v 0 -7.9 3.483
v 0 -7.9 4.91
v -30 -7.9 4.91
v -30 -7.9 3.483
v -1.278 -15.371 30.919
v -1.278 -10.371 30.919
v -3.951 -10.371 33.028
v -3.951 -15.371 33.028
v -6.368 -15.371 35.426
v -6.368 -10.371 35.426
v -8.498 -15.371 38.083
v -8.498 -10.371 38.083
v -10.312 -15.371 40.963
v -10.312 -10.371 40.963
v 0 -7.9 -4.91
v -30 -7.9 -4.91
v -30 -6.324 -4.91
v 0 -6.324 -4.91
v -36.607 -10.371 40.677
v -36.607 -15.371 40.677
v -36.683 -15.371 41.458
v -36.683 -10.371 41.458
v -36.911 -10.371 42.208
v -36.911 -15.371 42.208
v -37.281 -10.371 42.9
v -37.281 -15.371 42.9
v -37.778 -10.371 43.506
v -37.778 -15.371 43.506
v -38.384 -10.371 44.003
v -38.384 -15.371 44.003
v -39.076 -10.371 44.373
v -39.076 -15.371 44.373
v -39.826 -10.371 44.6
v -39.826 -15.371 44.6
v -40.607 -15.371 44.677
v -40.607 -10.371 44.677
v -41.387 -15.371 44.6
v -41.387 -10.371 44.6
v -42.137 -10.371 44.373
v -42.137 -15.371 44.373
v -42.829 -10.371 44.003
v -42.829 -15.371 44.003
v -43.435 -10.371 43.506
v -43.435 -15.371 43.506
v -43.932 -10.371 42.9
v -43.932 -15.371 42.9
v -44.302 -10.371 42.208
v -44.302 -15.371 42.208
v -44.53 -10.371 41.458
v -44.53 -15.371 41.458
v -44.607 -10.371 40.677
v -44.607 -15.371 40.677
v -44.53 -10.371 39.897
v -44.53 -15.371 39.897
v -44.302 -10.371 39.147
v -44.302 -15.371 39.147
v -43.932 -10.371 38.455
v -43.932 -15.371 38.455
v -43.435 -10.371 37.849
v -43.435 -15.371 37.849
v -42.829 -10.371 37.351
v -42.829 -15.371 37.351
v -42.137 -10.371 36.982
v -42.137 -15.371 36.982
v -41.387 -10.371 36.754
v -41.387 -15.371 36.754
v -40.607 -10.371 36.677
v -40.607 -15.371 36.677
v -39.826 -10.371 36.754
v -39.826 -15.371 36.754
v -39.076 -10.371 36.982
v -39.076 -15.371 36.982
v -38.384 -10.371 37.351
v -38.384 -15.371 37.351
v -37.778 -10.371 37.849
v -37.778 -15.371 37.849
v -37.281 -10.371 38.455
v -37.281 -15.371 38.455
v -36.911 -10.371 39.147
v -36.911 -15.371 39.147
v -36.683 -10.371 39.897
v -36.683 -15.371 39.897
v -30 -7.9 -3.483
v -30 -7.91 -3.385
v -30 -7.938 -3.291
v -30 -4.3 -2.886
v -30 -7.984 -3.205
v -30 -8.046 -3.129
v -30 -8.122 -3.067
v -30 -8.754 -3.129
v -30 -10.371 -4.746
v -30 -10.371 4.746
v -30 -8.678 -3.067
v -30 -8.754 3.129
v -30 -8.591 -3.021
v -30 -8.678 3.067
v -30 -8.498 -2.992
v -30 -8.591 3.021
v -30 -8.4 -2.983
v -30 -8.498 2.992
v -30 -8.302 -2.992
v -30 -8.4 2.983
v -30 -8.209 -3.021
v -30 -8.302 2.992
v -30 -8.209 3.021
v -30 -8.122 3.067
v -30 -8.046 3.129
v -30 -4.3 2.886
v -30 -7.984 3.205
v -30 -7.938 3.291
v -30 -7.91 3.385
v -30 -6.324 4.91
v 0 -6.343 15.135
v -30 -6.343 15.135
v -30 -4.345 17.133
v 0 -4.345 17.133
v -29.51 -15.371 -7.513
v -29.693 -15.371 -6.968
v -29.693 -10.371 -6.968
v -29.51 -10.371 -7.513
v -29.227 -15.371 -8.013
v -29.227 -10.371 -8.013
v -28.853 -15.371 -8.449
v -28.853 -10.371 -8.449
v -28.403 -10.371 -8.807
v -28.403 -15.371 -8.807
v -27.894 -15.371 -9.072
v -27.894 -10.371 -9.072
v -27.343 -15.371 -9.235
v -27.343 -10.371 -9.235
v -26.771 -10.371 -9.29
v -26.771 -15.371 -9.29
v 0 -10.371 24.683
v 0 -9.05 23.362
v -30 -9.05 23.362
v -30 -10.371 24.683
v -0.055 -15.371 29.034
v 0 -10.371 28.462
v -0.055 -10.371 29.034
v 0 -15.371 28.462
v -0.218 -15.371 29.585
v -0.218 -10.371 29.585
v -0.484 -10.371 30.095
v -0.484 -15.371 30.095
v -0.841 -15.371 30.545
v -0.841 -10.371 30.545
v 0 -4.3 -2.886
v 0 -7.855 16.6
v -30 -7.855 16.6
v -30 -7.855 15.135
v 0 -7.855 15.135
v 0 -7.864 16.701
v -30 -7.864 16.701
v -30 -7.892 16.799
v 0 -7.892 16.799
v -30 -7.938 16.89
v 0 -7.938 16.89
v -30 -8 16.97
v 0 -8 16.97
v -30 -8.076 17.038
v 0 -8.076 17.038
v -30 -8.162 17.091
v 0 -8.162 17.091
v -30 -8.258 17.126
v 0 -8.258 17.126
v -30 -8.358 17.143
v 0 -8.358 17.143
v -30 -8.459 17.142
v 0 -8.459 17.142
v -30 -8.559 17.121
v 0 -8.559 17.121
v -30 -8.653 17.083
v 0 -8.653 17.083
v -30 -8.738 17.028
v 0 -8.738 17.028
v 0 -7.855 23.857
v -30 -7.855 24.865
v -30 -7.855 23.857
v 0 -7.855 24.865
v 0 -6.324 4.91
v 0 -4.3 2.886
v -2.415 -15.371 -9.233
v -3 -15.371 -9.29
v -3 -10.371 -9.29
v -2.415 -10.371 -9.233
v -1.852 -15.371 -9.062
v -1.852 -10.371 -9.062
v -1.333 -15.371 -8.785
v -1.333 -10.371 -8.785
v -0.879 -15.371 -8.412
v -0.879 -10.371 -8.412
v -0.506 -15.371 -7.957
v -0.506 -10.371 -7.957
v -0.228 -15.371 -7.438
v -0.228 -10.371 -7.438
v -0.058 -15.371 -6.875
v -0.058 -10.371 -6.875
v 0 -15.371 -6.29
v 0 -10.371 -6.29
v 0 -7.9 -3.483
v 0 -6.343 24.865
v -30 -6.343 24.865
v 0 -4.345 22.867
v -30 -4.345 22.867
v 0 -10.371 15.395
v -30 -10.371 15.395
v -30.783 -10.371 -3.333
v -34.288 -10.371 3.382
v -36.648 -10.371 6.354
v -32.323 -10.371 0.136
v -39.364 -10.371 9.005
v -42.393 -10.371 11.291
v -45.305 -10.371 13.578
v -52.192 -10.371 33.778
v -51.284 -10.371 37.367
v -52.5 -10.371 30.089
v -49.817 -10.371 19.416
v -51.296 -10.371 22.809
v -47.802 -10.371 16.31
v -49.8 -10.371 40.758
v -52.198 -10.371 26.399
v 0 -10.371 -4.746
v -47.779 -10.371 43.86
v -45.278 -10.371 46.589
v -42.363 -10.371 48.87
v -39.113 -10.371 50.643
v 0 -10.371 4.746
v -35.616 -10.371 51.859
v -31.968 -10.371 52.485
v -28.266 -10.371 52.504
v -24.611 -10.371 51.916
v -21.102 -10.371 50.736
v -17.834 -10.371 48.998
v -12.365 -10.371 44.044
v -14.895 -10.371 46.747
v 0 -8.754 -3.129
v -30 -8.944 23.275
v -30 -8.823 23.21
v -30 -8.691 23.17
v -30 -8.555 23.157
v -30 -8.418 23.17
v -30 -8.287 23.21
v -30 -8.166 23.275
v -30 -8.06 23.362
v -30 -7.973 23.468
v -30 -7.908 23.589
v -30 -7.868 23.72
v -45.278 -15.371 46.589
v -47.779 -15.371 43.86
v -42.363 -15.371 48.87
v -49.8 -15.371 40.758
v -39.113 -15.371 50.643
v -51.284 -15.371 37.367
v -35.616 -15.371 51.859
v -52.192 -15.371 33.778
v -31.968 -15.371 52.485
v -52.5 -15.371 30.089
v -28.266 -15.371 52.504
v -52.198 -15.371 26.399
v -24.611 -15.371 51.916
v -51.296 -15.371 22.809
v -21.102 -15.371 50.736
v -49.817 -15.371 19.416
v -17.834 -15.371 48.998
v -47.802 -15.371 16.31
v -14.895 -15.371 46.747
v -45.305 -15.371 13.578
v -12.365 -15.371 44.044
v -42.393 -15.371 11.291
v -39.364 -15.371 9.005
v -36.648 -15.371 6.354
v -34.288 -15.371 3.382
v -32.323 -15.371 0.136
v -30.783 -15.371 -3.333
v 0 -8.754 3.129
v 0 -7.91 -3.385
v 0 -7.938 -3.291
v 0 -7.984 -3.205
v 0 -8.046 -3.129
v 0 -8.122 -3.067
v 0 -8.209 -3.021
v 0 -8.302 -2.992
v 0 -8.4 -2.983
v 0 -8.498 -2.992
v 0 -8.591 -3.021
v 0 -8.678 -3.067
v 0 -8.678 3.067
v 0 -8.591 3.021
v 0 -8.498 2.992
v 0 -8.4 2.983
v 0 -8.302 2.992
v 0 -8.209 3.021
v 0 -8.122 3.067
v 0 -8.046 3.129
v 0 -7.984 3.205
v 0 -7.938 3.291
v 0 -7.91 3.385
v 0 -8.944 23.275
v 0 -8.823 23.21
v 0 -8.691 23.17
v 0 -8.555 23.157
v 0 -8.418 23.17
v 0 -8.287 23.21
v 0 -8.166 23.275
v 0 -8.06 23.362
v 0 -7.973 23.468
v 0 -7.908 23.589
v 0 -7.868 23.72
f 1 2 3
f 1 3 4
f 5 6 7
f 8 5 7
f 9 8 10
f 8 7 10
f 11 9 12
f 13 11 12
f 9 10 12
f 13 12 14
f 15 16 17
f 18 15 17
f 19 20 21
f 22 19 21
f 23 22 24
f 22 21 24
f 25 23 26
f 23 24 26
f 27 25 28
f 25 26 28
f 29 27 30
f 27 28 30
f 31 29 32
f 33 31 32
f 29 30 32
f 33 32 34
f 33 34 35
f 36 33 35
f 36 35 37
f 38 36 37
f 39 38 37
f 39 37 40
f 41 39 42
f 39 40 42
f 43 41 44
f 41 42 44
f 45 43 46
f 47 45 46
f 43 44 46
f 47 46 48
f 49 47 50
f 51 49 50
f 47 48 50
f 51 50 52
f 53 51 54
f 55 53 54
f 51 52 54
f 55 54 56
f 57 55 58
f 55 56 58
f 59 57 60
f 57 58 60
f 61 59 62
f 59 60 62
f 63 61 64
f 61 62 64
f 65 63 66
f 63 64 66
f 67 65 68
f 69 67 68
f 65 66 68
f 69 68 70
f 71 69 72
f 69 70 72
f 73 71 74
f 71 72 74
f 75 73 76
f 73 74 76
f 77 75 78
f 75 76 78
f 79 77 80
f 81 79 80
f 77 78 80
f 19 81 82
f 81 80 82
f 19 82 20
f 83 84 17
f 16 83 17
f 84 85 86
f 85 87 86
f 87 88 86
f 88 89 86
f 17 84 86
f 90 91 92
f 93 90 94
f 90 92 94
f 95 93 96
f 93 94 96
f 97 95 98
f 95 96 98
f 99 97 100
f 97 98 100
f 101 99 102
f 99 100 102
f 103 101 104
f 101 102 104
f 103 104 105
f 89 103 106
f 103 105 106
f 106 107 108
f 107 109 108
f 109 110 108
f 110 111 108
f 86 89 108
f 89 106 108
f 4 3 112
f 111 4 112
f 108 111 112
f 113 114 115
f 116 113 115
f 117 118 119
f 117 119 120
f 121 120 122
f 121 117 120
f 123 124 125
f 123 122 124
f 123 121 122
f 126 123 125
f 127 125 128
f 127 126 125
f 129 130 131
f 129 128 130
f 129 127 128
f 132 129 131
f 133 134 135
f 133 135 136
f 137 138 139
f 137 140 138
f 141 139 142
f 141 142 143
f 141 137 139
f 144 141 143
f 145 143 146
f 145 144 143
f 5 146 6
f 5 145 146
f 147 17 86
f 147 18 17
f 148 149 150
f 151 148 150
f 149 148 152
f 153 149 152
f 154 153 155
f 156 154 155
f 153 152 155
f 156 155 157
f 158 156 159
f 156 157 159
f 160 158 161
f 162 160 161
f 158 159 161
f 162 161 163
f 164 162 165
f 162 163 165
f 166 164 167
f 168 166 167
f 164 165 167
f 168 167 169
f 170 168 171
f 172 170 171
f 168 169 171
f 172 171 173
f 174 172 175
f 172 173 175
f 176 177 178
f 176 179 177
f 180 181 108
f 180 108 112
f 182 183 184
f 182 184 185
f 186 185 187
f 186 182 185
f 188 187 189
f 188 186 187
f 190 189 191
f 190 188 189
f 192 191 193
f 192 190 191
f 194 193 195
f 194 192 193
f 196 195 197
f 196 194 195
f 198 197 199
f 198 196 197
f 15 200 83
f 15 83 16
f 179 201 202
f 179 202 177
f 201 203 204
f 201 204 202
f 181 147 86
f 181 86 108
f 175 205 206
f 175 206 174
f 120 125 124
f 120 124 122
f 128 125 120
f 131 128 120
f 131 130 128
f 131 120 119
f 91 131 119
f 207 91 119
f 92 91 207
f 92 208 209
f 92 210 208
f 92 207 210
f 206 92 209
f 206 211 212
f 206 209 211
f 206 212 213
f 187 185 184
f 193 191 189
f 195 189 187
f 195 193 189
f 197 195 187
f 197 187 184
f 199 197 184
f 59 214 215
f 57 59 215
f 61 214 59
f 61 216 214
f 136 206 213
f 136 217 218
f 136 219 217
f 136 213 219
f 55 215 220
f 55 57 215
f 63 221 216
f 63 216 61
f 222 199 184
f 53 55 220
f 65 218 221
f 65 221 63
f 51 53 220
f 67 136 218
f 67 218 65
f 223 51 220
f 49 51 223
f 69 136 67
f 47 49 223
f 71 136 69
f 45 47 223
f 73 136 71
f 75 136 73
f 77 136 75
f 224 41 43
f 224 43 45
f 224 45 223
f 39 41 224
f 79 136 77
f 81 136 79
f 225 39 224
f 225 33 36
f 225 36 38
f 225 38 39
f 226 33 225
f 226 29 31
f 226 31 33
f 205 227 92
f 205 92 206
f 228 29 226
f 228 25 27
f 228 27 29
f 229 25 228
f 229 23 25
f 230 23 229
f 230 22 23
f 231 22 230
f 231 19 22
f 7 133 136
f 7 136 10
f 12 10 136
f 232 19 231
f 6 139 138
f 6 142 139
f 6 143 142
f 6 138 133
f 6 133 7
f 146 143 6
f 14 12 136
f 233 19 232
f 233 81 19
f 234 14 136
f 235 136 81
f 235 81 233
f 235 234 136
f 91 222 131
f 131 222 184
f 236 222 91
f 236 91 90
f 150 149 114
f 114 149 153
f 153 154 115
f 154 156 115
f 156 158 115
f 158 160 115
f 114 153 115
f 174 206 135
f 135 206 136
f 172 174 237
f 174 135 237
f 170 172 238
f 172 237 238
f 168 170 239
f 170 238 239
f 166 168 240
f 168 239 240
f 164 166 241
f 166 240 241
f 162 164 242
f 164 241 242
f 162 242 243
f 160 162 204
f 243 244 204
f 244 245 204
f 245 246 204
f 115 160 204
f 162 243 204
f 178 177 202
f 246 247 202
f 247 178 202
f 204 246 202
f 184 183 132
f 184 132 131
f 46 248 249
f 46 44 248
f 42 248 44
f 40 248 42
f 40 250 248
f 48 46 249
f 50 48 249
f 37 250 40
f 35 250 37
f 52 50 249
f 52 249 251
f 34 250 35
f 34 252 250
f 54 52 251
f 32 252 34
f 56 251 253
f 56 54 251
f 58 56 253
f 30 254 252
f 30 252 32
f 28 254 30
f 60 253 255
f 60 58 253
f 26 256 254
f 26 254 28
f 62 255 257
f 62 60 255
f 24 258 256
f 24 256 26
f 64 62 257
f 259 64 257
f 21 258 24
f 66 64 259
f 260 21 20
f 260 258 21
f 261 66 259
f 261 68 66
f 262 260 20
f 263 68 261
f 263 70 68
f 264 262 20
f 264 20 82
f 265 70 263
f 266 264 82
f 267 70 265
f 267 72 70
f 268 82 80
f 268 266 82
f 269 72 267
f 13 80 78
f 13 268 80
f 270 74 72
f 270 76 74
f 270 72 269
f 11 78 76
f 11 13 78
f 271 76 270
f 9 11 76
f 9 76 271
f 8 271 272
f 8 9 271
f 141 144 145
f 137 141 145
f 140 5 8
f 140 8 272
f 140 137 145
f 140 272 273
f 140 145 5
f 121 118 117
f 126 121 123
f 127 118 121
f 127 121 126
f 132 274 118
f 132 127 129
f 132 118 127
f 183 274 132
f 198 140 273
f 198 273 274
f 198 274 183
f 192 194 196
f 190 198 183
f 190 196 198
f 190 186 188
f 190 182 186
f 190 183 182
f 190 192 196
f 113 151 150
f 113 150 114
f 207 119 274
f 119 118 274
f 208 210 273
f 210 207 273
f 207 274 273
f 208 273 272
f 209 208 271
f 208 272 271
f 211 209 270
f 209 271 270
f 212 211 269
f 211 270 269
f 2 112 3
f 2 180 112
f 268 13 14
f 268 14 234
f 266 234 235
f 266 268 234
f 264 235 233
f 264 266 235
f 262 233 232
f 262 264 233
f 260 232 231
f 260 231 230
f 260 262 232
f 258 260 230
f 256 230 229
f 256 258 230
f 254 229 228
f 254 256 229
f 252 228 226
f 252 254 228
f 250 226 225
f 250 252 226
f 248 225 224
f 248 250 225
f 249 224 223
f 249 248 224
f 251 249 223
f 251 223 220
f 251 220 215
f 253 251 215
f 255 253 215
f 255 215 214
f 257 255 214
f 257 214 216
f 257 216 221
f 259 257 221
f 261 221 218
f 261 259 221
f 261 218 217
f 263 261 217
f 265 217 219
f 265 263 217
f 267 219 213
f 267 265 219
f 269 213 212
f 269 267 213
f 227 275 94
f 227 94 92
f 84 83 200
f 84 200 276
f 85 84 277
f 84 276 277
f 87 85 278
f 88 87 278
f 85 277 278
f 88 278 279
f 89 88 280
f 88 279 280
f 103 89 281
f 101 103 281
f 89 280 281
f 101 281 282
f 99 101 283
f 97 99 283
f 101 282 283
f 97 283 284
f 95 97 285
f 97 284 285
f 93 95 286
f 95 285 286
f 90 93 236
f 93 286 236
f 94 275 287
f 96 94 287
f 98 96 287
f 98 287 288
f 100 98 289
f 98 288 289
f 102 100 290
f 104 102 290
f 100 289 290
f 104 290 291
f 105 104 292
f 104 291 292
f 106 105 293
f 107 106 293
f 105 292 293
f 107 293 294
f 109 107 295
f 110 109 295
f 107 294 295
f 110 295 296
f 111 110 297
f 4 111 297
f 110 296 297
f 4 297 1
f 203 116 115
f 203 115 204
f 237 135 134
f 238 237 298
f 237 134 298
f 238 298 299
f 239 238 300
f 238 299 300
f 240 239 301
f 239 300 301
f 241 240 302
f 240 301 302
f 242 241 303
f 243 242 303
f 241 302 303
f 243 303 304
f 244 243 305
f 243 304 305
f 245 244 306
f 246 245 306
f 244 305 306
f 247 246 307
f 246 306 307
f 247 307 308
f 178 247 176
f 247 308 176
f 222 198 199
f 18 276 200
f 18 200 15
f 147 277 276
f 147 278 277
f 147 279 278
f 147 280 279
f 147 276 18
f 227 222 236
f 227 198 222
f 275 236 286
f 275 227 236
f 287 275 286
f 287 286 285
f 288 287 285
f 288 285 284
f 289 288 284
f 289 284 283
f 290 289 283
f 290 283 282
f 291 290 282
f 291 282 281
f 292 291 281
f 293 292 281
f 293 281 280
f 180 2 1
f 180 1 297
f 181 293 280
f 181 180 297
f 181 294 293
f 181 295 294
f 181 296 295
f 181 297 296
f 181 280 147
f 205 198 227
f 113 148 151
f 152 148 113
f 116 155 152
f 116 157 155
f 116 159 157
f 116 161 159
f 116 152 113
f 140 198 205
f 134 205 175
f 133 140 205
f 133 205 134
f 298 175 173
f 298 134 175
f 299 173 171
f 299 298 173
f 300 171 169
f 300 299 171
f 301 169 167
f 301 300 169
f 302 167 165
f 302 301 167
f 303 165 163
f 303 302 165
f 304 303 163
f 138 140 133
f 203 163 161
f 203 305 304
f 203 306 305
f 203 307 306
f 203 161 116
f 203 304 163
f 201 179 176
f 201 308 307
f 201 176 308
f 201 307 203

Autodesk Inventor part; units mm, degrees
ref_plane "YZ Plane" through (0, 0, 0) normal (1, 0, 0) x (0, 1, 0)
ref_plane "XZ Plane" through (0, 0, 0) normal (0, 1, 0) x (-1, 0, 0)
ref_plane "XY Plane" through (0, 0, 0) normal (0, 0, 1) x (1, 0, 0)
sketch "Sketch1" plane through (0, 0, 0) normal (1, 0, 0) x (0, 1, 0)
  line L0 (-10.3707, -4.7464) -> (-8.7536, -3.1293)
  line L1 (-10.3707, 15.395) -> (-8.7381, 17.0275)
  arc A0 (-7.8549, 16.6) -> (-8.7381, 17.0275) centre (-8.4, 16.6) ccw
  line L2 (-7.8549, 16.6) -> (-7.8549, 15.135)
  line L3 (-7.8549, 15.135) -> (-6.3429, 15.135)
  line L4 (-6.3429, 15.135) -> (-4.3451, 17.1329)
  line L5 (-4.3451, 17.1329) -> (-4.3451, 22.8671)
  line L6 (-4.3451, 22.8671) -> (-6.3429, 24.865)
  line L7 (-6.3429, 24.865) -> (-7.8549, 24.865)
  line L8 (-7.8549, 24.865) -> (-7.8549, 23.8568)
  arc A1 (-9.0499, 23.3618) -> (-7.8549, 23.8568) centre (-8.5549, 23.8568) ccw
  line L9 (-9.0499, 23.3618) -> (-10.3707, 24.6827)
  line L10 (-10.3707, 24.6827) -> (-10.3707, 30.0707)
  line L11 (-10.3707, 30.0707) -> (-11.3707, 30.0707)
  line L12 (-11.9747, -9.2902) -> (-10.3707, -9.2902)
  arc A2 (-7.9, -3.4828) -> (-8.7536, -3.1293) centre (-8.4, -3.4828) ccw
  line L13 (-7.9, -3.4828) -> (-7.9, -4.9101)
  line L14 (-7.9, -4.9101) -> (-6.3243, -4.9101)
  line L15 (-6.3243, -4.9101) -> (-4.3, -2.8858)
  line L16 (-4.3, -2.8858) -> (-4.3, 2.8858)
  line L17 (-4.3, 2.8858) -> (-6.3243, 4.9101)
  line L18 (-6.3243, 4.9101) -> (-7.9, 4.9101)
  line L19 (-7.9, 4.9101) -> (-7.9, 3.4828)
  arc A3 (-8.7536, 3.1293) -> (-7.9, 3.4828) centre (-8.4, 3.4828) ccw
  line L20 (-8.7536, 3.1293) -> (-10.3707, 4.7464)
  line L21 (-10.3707, 15.395) -> (-10.3707, 4.7464)
  line L22 (-10.3707, 30.0707) -> (-15.3707, 30.0707)
  line L23 (-15.3707, 30.0707) -> (-15.3707, -9.2902)
  line L24 (-15.3707, -9.2902) -> (-10.3707, -9.2902)
  line L25 (-10.3707, 24.6827) -> (-10.3707, 30.0707)
  line L26 (-10.3707, -9.2902) -> (-10.3707, -4.7464)
  line L27 (-10.3707, 4.7464) -> (-10.3707, 15.395)
  point P0 (0, 0)
  point P1 (-7.8549, 16.6)
  point P2 (-9.0499, 23.3618)
  dimension "d0" = 5
extrude "Extrusion1" add sketch "Sketch1" against normal blind 30
sketch "Sketch2" plane through (0, -15.3707, -9.2902) normal (0, -1, 0) x (1, 0, 0)
  line L0 (-30, 0) -> (-30, 39.3609) projected
  circle A0 centre (-30, 39.3609) radius 22.5
  circle A1 centre (-40.6066, 49.9675) radius 4
  point P0 (0, 9.2902)
  dimension "d3" = 45
  dimension "d4" = 8
  dimension "d5" = 10.6066
  dimension "d6" = 10.6066
extrude "Extrusion2" add sketch "Sketch2" against normal blind 5
fillet "Fillet1" radius 30 1 edges at (-7.5, -12.8707, 30.0707)
fillet "Fillet2" radius 3 1 edges at (0, -12.8707, 30.0707)
sketch "Sketch3" plane through (-30, 0, 0) normal (-1, 0, 0) x (0, 0, 1)
  line L0 (7.5707, -15.3707) -> (7.5707, -10.3707) projected
  line L1 (-9.2902, -10.3707) -> (-9.2902, -15.3707) projected
  line L2 (7.5707, -15.3707) -> (-9.2902, -15.3707)
  line L3 (-9.2902, -15.3707) -> (-9.2902, -10.3707)
  line L4 (-9.2902, -10.3707) -> (7.5707, -10.3707)
  line L5 (7.5707, -10.3707) -> (7.5707, -15.3707)
  point P0 (0, 0)
extrude "Extrusion3" cut sketch "Sketch3" against normal blind 0.75
fillet "Fillet3" radius 30 1 edges at (-29.25, -12.8707, 7.5707)
fillet "Fillet4" radius 3 1 edges at (0, -12.8707, -9.2902)
fillet "Fillet5" radius 3 1 edges at (-29.25, -12.8707, -9.2902)
equation "\"d6\" = d5"
properties part number "Webcam Mount"
